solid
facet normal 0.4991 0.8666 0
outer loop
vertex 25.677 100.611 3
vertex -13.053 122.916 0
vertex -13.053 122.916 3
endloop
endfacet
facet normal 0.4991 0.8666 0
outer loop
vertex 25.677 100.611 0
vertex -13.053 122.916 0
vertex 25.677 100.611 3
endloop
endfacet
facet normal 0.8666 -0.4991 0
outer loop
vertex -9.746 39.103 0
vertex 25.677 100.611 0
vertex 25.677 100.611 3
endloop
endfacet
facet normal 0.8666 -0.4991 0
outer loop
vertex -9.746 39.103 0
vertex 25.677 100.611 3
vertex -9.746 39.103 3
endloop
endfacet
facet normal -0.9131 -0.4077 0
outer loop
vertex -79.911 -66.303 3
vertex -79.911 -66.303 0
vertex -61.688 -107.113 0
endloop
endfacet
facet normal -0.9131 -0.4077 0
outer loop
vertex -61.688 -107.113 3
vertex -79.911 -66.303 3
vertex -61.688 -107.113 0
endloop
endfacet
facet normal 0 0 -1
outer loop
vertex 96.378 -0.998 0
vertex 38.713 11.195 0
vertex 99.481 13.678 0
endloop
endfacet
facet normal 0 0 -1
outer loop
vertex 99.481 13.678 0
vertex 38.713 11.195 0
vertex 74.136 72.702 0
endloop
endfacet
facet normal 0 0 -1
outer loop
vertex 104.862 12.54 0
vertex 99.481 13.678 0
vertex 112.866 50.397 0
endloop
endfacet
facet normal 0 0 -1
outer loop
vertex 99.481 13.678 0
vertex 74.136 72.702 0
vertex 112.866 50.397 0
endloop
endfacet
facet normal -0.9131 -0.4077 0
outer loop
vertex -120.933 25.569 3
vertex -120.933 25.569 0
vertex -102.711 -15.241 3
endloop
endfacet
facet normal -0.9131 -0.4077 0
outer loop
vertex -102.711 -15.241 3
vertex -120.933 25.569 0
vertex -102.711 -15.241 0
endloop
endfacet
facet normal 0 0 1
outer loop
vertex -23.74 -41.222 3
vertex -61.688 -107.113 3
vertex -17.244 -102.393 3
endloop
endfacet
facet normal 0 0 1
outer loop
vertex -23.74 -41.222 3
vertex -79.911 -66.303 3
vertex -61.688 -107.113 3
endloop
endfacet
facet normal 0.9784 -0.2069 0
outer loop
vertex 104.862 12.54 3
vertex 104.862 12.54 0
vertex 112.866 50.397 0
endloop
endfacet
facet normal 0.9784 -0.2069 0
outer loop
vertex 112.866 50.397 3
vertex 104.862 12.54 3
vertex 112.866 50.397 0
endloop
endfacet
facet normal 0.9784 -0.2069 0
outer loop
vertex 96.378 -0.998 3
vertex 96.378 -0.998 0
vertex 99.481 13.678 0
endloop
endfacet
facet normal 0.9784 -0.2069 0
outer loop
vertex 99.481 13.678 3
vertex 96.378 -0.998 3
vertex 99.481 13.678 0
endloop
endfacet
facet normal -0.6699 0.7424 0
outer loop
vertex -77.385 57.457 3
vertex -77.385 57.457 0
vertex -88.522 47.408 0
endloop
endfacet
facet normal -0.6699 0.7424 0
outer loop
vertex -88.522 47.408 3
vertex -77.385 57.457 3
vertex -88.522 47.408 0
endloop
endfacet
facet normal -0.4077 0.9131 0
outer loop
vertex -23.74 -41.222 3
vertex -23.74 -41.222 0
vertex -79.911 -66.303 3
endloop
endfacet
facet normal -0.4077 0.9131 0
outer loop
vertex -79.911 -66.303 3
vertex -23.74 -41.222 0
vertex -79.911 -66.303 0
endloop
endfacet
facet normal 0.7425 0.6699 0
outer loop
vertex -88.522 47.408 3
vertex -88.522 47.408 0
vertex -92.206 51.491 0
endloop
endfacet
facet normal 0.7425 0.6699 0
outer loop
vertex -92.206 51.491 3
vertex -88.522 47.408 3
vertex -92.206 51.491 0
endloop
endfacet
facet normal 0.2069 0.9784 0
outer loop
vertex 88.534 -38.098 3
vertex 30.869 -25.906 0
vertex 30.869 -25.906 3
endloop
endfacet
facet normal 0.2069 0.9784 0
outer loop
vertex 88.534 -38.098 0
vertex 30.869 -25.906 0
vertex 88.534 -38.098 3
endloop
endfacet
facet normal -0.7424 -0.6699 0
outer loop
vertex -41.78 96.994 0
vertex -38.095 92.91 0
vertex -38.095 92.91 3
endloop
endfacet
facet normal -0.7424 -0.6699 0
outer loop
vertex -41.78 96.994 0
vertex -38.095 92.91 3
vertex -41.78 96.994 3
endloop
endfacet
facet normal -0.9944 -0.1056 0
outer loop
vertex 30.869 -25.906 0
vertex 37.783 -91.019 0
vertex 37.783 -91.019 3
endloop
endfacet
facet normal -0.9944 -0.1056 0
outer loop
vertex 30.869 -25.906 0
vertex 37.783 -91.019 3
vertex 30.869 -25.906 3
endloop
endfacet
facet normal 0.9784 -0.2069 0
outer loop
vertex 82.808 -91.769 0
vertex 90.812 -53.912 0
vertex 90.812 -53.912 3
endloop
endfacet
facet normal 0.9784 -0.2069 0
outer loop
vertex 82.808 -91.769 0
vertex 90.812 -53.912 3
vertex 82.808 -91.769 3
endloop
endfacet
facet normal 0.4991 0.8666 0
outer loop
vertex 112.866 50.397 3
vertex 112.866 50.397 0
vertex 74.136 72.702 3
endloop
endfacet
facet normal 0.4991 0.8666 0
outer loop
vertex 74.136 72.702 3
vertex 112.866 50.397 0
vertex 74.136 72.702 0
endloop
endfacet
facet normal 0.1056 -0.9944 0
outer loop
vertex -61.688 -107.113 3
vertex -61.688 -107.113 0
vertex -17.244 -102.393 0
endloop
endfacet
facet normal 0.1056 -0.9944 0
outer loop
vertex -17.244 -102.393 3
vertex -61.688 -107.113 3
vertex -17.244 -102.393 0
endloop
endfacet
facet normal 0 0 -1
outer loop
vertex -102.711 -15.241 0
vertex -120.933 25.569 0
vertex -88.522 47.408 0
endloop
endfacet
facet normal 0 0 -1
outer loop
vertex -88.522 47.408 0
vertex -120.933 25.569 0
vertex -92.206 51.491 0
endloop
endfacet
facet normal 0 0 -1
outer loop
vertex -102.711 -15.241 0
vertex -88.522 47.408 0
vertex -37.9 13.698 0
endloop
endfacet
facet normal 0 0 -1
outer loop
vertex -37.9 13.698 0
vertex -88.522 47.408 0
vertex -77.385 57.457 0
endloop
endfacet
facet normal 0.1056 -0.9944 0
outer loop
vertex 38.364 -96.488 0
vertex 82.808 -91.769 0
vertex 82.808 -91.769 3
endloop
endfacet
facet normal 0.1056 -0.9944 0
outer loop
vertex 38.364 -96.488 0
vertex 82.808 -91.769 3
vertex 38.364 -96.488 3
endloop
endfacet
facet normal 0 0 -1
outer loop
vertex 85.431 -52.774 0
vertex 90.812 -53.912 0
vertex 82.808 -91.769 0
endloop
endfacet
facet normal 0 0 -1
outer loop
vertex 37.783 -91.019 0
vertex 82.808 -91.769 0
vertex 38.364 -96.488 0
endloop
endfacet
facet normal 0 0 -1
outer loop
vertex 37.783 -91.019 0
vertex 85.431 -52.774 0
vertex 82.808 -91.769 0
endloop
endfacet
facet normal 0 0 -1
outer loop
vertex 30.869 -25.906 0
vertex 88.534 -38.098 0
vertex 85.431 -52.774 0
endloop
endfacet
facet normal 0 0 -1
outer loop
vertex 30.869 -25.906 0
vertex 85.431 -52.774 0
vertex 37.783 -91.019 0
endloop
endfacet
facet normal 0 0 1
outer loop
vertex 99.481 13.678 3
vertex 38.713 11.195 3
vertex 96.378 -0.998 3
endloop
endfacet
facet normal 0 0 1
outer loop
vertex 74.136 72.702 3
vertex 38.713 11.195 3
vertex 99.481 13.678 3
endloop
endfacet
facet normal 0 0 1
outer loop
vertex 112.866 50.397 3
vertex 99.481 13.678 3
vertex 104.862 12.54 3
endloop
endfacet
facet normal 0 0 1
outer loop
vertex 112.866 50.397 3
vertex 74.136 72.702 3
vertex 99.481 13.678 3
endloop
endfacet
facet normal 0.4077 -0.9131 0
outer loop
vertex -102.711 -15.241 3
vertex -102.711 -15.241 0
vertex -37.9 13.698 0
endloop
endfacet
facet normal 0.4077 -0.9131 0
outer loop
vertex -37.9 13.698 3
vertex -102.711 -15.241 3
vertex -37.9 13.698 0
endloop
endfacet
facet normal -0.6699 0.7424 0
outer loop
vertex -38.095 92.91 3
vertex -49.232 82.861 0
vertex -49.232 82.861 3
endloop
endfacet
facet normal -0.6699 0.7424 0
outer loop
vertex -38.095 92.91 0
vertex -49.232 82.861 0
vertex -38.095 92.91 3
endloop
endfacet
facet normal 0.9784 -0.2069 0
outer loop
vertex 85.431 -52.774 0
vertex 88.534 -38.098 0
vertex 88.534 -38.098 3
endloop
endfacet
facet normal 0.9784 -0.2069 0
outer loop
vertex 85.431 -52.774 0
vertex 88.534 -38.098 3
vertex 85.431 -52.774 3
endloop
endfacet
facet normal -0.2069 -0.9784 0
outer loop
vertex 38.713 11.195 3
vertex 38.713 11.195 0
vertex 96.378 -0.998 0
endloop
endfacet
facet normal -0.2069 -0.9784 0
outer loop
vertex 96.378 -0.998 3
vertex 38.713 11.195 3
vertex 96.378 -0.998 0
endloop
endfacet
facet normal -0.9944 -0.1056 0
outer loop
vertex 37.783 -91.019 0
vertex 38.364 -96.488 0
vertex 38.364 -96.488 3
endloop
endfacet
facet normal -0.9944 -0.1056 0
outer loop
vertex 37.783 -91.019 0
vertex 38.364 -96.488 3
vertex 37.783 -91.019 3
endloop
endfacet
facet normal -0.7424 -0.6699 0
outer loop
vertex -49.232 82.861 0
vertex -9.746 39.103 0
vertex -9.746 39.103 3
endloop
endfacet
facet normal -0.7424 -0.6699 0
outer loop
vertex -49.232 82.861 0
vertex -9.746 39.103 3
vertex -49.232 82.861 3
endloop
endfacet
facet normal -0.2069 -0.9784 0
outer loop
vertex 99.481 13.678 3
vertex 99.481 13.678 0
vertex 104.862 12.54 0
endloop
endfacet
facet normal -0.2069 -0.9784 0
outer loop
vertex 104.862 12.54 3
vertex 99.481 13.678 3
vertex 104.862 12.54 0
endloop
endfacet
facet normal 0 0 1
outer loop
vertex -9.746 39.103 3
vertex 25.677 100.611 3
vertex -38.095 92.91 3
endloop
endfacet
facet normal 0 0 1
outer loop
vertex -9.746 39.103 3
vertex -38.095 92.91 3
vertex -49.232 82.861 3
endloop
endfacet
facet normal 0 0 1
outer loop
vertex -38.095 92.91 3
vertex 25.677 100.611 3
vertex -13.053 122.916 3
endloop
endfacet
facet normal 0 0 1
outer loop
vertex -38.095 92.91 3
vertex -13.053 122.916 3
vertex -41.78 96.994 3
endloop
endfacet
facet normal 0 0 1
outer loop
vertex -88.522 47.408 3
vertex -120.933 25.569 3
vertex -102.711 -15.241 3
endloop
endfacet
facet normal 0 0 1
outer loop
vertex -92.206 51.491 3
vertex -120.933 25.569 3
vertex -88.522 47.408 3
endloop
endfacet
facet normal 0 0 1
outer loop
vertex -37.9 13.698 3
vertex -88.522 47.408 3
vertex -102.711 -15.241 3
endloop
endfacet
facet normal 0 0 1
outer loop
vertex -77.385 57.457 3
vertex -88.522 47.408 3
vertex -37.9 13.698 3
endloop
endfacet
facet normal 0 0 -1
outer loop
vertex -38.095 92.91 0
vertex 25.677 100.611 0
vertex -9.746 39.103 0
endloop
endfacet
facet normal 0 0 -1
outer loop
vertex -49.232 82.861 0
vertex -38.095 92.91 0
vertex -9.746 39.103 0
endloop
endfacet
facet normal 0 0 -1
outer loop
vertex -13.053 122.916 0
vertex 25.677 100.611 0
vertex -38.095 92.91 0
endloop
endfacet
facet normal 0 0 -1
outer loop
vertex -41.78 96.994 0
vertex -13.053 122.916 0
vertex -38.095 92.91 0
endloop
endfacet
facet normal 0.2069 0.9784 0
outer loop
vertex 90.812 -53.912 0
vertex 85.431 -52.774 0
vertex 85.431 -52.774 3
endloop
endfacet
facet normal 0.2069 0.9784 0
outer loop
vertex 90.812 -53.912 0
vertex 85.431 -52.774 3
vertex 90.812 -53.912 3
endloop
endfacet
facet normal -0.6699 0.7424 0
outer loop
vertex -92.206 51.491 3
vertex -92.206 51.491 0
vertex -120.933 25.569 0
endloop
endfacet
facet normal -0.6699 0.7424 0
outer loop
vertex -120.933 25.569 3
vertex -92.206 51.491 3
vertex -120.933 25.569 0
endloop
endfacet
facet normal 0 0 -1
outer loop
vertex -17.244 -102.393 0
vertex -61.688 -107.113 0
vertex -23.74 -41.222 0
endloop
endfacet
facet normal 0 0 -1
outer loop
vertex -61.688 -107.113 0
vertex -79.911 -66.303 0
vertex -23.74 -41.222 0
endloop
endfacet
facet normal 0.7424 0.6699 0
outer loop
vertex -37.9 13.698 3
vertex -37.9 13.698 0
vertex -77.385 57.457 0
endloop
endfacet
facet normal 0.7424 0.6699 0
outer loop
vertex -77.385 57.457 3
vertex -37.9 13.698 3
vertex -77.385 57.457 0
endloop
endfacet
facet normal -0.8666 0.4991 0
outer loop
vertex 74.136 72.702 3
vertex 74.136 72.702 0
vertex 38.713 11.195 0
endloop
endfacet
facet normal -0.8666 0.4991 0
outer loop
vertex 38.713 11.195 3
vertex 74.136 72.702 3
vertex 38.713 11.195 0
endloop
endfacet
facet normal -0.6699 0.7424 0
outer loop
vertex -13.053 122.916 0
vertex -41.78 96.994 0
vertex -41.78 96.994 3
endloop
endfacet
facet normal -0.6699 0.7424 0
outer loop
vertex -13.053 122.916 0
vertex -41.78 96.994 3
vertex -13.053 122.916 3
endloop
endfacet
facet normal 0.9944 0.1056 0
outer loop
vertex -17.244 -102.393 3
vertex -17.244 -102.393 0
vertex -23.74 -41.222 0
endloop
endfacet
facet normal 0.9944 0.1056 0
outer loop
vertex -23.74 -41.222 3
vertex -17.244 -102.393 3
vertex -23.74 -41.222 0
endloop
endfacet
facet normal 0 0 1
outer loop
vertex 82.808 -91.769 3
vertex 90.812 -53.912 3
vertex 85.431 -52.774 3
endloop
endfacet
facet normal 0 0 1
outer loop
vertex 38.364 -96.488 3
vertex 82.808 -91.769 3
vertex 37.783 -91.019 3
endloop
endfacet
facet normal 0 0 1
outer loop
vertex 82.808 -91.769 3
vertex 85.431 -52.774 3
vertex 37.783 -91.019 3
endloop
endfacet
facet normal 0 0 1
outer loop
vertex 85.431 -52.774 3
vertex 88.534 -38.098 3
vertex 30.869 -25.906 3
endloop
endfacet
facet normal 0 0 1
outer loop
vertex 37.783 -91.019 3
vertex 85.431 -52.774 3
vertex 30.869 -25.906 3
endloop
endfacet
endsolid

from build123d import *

# Parameters (mm, degrees)
BOSS_EXTRUDE1_DEPTH   = 3
BOSS_EXTRUDE1_2_DEPTH = 3
BOSS_EXTRUDE1_3_DEPTH = 3
BOSS_EXTRUDE1_4_DEPTH = 3
BOSS_EXTRUDE1_5_DEPTH = 3


with BuildPart() as part:
    # Sketch15 → Boss-Extrude1 (new body)
    with BuildSketch(Plane.XY):
        Polygon((-61.688025962, -107.113154668), (-17.244174379, -102.39349725), (-23.74022552, -41.221783455), (-79.910592339, -66.30299436), align=None)
    extrude(amount=BOSS_EXTRUDE1_DEPTH)


with BuildPart() as body_2:
    # Sketch15 → Boss-Extrude1 2 (new body)
    with BuildSketch(Plane.XY):
        Polygon((-92.206166548, 51.491152029), (-120.9333121, 25.569013955), (-102.710745723, -15.241146353), (-37.89950418, 13.698390813), (-77.385194882, 57.456786854), (-88.521546505, 47.4078231), align=None)
    extrude(amount=BOSS_EXTRUDE1_2_DEPTH)


with BuildPart() as body_3:
    # Sketch15 → Boss-Extrude1 3 (new body)
    with BuildSketch(Plane.XY):
        Polygon((-13.052871288, 122.915674351), (25.677104965, 100.610516894), (-9.746057716, 39.102847555), (-49.231748421, 82.861243593), (-38.095396799, 92.910207346), (-41.780016842, 96.993536275), align=None)
    extrude(amount=BOSS_EXTRUDE1_3_DEPTH)


with BuildPart() as body_4:
    # Sketch15 → Boss-Extrude1 4 (new body)
    with BuildSketch(Plane.XY):
        Polygon((104.862095509, 12.540207816), (112.866193993, 50.397050544), (74.13621774, 72.702208001), (38.71305506, 11.194538662), (96.37818973, -0.997640709), (99.481054752, 13.677924991), align=None)
    extrude(amount=BOSS_EXTRUDE1_4_DEPTH)


with BuildPart() as body_5:
    # Sketch15 → Boss-Extrude1 5 (new body)
    with BuildSketch(Plane.XY):
        Polygon((30.868803436, -25.906279208), (88.533938106, -38.098458575), (85.431073084, -52.774024276), (90.812113841, -53.911741451), (82.808015356, -91.768584182), (38.364163773, -96.4882416), (37.783364065, -91.018993782), align=None)
    extrude(amount=BOSS_EXTRUDE1_5_DEPTH)


solid = Compound([part.part, body_2.part, body_3.part, body_4.part, body_5.part])
